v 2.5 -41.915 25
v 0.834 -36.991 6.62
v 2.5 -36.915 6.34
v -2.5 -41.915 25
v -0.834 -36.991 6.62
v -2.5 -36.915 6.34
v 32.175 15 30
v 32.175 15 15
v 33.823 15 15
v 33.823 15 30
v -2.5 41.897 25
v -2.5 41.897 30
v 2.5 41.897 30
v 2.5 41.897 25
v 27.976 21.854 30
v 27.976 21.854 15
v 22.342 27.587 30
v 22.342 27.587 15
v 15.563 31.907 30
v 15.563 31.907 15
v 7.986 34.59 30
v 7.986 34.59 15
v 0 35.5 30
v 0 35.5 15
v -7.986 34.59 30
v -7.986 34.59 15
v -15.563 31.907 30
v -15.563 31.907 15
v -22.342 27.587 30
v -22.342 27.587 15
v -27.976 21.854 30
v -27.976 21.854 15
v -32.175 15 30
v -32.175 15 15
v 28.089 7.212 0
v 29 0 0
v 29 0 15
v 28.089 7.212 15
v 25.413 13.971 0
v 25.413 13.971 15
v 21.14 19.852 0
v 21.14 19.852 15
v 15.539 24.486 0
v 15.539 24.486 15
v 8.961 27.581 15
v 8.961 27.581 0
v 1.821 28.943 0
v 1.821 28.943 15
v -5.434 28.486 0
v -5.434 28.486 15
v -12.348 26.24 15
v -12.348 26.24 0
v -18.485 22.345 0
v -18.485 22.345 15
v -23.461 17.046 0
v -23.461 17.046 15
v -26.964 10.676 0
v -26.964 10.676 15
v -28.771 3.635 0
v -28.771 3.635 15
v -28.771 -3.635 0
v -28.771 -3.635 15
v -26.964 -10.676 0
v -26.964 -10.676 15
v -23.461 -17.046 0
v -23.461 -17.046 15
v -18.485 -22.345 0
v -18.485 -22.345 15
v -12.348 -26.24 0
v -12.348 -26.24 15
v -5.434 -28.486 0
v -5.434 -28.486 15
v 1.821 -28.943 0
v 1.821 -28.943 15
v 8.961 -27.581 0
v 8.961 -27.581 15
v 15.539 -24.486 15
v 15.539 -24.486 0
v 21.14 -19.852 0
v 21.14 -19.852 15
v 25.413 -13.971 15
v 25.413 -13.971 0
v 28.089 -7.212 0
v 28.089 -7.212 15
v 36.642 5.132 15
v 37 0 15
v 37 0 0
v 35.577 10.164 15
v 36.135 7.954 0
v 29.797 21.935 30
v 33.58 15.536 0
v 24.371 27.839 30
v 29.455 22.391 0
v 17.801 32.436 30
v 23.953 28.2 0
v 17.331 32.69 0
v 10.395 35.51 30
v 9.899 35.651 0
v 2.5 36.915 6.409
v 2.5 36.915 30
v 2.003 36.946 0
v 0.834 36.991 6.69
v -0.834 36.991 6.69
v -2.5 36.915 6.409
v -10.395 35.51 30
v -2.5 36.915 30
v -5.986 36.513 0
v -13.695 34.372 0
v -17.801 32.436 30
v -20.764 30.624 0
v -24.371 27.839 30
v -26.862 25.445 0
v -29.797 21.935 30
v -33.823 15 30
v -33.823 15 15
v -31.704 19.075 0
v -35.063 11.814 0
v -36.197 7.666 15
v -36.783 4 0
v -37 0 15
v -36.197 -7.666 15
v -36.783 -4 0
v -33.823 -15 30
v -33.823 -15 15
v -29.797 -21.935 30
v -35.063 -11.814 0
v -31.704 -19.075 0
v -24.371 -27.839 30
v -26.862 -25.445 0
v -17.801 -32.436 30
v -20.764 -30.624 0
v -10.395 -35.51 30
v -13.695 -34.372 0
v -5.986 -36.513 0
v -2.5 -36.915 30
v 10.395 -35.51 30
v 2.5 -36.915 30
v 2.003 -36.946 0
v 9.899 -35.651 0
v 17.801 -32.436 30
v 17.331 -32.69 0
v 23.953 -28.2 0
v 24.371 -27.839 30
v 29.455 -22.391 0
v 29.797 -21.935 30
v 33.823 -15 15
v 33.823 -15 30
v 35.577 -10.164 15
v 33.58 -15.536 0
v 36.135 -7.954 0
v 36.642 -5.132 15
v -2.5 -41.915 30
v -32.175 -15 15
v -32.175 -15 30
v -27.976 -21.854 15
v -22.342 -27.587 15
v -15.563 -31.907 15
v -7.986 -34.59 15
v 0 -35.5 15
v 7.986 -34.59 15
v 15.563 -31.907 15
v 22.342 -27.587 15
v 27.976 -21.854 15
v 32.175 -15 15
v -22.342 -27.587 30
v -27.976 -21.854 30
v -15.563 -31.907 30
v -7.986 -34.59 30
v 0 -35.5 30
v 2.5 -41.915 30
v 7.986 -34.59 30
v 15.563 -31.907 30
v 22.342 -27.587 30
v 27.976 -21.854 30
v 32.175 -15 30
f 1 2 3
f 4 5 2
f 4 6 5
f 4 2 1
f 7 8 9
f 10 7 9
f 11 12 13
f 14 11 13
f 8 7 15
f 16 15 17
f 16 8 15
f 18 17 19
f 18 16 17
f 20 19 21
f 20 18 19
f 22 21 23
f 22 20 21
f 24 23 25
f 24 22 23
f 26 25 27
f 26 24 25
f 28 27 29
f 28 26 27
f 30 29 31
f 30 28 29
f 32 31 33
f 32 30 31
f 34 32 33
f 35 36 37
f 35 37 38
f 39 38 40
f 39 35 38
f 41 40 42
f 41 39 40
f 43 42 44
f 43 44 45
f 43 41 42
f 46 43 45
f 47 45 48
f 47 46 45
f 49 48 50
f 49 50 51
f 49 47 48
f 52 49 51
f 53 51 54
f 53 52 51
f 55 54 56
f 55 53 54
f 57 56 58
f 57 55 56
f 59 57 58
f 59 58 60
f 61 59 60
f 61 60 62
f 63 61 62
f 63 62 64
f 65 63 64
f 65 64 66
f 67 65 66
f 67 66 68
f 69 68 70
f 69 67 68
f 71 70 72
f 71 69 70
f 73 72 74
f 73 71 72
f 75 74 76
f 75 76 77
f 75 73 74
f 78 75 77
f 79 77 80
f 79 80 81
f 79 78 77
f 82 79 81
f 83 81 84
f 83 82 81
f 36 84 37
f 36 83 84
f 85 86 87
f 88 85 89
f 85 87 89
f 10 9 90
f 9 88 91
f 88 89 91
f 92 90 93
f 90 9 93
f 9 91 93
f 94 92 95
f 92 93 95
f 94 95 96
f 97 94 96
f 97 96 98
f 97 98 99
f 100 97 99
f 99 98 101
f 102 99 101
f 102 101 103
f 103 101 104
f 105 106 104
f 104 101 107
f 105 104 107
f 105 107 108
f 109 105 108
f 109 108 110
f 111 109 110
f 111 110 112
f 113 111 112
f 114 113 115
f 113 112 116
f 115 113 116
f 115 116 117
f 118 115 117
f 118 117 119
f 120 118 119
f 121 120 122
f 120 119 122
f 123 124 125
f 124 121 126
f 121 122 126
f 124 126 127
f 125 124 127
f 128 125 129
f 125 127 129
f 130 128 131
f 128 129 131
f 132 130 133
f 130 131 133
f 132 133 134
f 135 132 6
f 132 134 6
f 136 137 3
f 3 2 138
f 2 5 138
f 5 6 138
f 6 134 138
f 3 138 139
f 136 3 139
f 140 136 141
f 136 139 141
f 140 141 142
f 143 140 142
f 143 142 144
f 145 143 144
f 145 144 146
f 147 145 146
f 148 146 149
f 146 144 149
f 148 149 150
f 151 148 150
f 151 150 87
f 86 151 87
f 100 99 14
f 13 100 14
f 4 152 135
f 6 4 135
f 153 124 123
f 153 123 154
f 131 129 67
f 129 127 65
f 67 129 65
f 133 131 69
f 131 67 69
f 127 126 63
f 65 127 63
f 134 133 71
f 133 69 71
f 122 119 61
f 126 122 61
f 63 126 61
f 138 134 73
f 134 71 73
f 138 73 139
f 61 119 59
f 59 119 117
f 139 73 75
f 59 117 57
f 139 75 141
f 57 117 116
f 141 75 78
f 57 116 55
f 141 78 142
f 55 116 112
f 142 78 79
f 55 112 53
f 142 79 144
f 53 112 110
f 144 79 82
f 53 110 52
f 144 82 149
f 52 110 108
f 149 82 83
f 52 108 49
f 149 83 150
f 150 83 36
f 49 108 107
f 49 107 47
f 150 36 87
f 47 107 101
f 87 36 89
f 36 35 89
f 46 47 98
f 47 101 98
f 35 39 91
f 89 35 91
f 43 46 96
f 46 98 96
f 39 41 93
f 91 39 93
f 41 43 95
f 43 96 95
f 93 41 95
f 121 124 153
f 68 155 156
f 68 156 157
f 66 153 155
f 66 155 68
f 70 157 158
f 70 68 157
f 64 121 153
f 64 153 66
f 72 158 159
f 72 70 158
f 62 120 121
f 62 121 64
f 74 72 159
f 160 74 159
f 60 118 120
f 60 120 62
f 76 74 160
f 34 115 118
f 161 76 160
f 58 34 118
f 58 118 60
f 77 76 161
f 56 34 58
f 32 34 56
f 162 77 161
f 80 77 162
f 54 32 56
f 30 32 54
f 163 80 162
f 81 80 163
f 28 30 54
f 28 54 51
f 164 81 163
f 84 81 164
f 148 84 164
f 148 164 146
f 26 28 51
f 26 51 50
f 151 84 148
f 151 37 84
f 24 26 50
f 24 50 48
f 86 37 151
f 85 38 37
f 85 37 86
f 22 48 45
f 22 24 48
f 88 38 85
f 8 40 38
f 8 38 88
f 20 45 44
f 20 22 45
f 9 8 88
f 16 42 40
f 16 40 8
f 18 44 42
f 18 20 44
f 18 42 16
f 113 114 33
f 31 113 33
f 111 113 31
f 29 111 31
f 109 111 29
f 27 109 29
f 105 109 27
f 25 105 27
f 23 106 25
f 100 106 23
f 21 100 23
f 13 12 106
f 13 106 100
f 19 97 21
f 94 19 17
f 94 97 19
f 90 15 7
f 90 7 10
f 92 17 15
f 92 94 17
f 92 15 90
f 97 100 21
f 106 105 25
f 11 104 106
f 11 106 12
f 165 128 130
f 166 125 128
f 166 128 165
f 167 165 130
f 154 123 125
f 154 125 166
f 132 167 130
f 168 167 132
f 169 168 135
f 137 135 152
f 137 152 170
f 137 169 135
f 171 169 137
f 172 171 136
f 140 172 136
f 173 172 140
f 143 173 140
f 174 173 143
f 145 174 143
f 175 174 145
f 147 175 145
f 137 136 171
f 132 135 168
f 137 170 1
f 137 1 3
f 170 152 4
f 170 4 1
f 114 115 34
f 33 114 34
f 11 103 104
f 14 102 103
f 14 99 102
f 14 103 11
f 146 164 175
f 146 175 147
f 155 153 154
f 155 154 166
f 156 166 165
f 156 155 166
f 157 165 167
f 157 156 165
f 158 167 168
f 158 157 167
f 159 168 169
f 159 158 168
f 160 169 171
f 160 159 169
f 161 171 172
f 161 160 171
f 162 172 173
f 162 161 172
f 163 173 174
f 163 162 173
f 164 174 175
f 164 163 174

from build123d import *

# Parameters (mm, degrees)
F0_R         = 37
F0_R_2       = 35.5
F1_DEPTH     = 30
F2_W         = 100
F2_H         = 30
F3_DEPTH     = 15
F6_R         = 35.5
F6_R_2       = 29
F7_DEPTH     = 15
F8_W         = 5
F8_H         = 5
F9_DEPTH     = 25
F10_T4_DEPTH = 108.868862808
F10_S5_R     = 37
F10_T6_DEPTH = 57
F11_W        = 5
F11_H        = 5
F12_DEPTH    = 25
F13_T4_DEPTH = 108.868862808
F13_S5_R     = 37
F13_T6_DEPTH = 57


# Not quite as in the source:
# - a fillet or chamfer that OpenCascade refuses, or shapes differently, is made with other operations: its cross-section is extruded or revolved along the edge and cut away or added


with BuildPart() as f1:
    # F0 (on Top) → F1 (new body)
    with BuildSketch(Plane.XY):
        Circle(F0_R)
        Circle(F0_R_2, mode=Mode.SUBTRACT)
    extrude(amount=F1_DEPTH)


with BuildPart() as f3:
    # F2 (on Top) → F3 (new body)
    with BuildSketch(Plane.XY):
        Rectangle(F2_W, F2_H)
    extrude(amount=F3_DEPTH)


with BuildPart() as f3_1:
    # F4: moved
    add(f3.part.moved(Location((0, 0, 15))))


with BuildPart() as f1_1:
    add(f1.part)

    # F5: cut F3
    add(f3_1.part, mode=Mode.SUBTRACT)

    # F6 (on Top) → F7 (join)
    with BuildSketch(Plane.XY):
        Circle(F6_R)
        Circle(F6_R_2, mode=Mode.SUBTRACT)
    extrude(amount=F7_DEPTH)

    # F8 (on face) → F9 (join)
    with BuildSketch(Plane.XY.offset(30)):
        with Locations((0, -39.4154439226)):
            Rectangle(F8_W, F8_H)
    extrude(amount=-F9_DEPTH)

    # F10: chamfer of 20 x 5.3589838486 on 1 edges, made by hand


with BuildPart() as f10_tool2:
    # F10_s3 → F10_t4 (new body)
    with BuildSketch(Plane.YZ.offset(-54.434431404)):
        Polygon((-36.5564600739, 5), (-41.9154439226, 25), (-41.9154439226, 5), align=None)
    extrude(amount=F10_T4_DEPTH)

    # F10_s5 → F10_t6 (cut, symmetric)
    with BuildSketch(Plane.XY.offset(15)):
        Circle(F10_S5_R)
    extrude(amount=F10_T6_DEPTH, both=True, mode=Mode.SUBTRACT)


with BuildPart() as f1_2:
    add(f1_1.part)

    # F10_t1: cut F10_tool2
    add(f10_tool2.part, mode=Mode.SUBTRACT)

    # F11 (on face) → F12 (join)
    with BuildSketch(Plane.XY.offset(30)):
        with Locations((0, 39.3967875838)):
            Rectangle(F11_W, F11_H)
    extrude(amount=-F12_DEPTH)

    # F13: chamfer of 20 x 5.3589838486 on 1 edges, made by hand


with BuildPart() as f13_tool2:
    # F13_s3 → F13_t4 (new body)
    with BuildSketch(Plane.YZ.offset(54.434431404)):
        Polygon((36.5378037352, 5), (41.8967875838, 25), (41.8967875838, 5), align=None)
    extrude(amount=-F13_T4_DEPTH)

    # F13_s5 → F13_t6 (cut, symmetric)
    with BuildSketch(Plane.XY.offset(15)):
        Circle(F13_S5_R)
    extrude(amount=F13_T6_DEPTH, both=True, mode=Mode.SUBTRACT)


with BuildPart() as f1_3:
    add(f1_2.part)

    # F13_t1: cut F13_tool2
    add(f13_tool2.part, mode=Mode.SUBTRACT)


solid = f1_3.part
